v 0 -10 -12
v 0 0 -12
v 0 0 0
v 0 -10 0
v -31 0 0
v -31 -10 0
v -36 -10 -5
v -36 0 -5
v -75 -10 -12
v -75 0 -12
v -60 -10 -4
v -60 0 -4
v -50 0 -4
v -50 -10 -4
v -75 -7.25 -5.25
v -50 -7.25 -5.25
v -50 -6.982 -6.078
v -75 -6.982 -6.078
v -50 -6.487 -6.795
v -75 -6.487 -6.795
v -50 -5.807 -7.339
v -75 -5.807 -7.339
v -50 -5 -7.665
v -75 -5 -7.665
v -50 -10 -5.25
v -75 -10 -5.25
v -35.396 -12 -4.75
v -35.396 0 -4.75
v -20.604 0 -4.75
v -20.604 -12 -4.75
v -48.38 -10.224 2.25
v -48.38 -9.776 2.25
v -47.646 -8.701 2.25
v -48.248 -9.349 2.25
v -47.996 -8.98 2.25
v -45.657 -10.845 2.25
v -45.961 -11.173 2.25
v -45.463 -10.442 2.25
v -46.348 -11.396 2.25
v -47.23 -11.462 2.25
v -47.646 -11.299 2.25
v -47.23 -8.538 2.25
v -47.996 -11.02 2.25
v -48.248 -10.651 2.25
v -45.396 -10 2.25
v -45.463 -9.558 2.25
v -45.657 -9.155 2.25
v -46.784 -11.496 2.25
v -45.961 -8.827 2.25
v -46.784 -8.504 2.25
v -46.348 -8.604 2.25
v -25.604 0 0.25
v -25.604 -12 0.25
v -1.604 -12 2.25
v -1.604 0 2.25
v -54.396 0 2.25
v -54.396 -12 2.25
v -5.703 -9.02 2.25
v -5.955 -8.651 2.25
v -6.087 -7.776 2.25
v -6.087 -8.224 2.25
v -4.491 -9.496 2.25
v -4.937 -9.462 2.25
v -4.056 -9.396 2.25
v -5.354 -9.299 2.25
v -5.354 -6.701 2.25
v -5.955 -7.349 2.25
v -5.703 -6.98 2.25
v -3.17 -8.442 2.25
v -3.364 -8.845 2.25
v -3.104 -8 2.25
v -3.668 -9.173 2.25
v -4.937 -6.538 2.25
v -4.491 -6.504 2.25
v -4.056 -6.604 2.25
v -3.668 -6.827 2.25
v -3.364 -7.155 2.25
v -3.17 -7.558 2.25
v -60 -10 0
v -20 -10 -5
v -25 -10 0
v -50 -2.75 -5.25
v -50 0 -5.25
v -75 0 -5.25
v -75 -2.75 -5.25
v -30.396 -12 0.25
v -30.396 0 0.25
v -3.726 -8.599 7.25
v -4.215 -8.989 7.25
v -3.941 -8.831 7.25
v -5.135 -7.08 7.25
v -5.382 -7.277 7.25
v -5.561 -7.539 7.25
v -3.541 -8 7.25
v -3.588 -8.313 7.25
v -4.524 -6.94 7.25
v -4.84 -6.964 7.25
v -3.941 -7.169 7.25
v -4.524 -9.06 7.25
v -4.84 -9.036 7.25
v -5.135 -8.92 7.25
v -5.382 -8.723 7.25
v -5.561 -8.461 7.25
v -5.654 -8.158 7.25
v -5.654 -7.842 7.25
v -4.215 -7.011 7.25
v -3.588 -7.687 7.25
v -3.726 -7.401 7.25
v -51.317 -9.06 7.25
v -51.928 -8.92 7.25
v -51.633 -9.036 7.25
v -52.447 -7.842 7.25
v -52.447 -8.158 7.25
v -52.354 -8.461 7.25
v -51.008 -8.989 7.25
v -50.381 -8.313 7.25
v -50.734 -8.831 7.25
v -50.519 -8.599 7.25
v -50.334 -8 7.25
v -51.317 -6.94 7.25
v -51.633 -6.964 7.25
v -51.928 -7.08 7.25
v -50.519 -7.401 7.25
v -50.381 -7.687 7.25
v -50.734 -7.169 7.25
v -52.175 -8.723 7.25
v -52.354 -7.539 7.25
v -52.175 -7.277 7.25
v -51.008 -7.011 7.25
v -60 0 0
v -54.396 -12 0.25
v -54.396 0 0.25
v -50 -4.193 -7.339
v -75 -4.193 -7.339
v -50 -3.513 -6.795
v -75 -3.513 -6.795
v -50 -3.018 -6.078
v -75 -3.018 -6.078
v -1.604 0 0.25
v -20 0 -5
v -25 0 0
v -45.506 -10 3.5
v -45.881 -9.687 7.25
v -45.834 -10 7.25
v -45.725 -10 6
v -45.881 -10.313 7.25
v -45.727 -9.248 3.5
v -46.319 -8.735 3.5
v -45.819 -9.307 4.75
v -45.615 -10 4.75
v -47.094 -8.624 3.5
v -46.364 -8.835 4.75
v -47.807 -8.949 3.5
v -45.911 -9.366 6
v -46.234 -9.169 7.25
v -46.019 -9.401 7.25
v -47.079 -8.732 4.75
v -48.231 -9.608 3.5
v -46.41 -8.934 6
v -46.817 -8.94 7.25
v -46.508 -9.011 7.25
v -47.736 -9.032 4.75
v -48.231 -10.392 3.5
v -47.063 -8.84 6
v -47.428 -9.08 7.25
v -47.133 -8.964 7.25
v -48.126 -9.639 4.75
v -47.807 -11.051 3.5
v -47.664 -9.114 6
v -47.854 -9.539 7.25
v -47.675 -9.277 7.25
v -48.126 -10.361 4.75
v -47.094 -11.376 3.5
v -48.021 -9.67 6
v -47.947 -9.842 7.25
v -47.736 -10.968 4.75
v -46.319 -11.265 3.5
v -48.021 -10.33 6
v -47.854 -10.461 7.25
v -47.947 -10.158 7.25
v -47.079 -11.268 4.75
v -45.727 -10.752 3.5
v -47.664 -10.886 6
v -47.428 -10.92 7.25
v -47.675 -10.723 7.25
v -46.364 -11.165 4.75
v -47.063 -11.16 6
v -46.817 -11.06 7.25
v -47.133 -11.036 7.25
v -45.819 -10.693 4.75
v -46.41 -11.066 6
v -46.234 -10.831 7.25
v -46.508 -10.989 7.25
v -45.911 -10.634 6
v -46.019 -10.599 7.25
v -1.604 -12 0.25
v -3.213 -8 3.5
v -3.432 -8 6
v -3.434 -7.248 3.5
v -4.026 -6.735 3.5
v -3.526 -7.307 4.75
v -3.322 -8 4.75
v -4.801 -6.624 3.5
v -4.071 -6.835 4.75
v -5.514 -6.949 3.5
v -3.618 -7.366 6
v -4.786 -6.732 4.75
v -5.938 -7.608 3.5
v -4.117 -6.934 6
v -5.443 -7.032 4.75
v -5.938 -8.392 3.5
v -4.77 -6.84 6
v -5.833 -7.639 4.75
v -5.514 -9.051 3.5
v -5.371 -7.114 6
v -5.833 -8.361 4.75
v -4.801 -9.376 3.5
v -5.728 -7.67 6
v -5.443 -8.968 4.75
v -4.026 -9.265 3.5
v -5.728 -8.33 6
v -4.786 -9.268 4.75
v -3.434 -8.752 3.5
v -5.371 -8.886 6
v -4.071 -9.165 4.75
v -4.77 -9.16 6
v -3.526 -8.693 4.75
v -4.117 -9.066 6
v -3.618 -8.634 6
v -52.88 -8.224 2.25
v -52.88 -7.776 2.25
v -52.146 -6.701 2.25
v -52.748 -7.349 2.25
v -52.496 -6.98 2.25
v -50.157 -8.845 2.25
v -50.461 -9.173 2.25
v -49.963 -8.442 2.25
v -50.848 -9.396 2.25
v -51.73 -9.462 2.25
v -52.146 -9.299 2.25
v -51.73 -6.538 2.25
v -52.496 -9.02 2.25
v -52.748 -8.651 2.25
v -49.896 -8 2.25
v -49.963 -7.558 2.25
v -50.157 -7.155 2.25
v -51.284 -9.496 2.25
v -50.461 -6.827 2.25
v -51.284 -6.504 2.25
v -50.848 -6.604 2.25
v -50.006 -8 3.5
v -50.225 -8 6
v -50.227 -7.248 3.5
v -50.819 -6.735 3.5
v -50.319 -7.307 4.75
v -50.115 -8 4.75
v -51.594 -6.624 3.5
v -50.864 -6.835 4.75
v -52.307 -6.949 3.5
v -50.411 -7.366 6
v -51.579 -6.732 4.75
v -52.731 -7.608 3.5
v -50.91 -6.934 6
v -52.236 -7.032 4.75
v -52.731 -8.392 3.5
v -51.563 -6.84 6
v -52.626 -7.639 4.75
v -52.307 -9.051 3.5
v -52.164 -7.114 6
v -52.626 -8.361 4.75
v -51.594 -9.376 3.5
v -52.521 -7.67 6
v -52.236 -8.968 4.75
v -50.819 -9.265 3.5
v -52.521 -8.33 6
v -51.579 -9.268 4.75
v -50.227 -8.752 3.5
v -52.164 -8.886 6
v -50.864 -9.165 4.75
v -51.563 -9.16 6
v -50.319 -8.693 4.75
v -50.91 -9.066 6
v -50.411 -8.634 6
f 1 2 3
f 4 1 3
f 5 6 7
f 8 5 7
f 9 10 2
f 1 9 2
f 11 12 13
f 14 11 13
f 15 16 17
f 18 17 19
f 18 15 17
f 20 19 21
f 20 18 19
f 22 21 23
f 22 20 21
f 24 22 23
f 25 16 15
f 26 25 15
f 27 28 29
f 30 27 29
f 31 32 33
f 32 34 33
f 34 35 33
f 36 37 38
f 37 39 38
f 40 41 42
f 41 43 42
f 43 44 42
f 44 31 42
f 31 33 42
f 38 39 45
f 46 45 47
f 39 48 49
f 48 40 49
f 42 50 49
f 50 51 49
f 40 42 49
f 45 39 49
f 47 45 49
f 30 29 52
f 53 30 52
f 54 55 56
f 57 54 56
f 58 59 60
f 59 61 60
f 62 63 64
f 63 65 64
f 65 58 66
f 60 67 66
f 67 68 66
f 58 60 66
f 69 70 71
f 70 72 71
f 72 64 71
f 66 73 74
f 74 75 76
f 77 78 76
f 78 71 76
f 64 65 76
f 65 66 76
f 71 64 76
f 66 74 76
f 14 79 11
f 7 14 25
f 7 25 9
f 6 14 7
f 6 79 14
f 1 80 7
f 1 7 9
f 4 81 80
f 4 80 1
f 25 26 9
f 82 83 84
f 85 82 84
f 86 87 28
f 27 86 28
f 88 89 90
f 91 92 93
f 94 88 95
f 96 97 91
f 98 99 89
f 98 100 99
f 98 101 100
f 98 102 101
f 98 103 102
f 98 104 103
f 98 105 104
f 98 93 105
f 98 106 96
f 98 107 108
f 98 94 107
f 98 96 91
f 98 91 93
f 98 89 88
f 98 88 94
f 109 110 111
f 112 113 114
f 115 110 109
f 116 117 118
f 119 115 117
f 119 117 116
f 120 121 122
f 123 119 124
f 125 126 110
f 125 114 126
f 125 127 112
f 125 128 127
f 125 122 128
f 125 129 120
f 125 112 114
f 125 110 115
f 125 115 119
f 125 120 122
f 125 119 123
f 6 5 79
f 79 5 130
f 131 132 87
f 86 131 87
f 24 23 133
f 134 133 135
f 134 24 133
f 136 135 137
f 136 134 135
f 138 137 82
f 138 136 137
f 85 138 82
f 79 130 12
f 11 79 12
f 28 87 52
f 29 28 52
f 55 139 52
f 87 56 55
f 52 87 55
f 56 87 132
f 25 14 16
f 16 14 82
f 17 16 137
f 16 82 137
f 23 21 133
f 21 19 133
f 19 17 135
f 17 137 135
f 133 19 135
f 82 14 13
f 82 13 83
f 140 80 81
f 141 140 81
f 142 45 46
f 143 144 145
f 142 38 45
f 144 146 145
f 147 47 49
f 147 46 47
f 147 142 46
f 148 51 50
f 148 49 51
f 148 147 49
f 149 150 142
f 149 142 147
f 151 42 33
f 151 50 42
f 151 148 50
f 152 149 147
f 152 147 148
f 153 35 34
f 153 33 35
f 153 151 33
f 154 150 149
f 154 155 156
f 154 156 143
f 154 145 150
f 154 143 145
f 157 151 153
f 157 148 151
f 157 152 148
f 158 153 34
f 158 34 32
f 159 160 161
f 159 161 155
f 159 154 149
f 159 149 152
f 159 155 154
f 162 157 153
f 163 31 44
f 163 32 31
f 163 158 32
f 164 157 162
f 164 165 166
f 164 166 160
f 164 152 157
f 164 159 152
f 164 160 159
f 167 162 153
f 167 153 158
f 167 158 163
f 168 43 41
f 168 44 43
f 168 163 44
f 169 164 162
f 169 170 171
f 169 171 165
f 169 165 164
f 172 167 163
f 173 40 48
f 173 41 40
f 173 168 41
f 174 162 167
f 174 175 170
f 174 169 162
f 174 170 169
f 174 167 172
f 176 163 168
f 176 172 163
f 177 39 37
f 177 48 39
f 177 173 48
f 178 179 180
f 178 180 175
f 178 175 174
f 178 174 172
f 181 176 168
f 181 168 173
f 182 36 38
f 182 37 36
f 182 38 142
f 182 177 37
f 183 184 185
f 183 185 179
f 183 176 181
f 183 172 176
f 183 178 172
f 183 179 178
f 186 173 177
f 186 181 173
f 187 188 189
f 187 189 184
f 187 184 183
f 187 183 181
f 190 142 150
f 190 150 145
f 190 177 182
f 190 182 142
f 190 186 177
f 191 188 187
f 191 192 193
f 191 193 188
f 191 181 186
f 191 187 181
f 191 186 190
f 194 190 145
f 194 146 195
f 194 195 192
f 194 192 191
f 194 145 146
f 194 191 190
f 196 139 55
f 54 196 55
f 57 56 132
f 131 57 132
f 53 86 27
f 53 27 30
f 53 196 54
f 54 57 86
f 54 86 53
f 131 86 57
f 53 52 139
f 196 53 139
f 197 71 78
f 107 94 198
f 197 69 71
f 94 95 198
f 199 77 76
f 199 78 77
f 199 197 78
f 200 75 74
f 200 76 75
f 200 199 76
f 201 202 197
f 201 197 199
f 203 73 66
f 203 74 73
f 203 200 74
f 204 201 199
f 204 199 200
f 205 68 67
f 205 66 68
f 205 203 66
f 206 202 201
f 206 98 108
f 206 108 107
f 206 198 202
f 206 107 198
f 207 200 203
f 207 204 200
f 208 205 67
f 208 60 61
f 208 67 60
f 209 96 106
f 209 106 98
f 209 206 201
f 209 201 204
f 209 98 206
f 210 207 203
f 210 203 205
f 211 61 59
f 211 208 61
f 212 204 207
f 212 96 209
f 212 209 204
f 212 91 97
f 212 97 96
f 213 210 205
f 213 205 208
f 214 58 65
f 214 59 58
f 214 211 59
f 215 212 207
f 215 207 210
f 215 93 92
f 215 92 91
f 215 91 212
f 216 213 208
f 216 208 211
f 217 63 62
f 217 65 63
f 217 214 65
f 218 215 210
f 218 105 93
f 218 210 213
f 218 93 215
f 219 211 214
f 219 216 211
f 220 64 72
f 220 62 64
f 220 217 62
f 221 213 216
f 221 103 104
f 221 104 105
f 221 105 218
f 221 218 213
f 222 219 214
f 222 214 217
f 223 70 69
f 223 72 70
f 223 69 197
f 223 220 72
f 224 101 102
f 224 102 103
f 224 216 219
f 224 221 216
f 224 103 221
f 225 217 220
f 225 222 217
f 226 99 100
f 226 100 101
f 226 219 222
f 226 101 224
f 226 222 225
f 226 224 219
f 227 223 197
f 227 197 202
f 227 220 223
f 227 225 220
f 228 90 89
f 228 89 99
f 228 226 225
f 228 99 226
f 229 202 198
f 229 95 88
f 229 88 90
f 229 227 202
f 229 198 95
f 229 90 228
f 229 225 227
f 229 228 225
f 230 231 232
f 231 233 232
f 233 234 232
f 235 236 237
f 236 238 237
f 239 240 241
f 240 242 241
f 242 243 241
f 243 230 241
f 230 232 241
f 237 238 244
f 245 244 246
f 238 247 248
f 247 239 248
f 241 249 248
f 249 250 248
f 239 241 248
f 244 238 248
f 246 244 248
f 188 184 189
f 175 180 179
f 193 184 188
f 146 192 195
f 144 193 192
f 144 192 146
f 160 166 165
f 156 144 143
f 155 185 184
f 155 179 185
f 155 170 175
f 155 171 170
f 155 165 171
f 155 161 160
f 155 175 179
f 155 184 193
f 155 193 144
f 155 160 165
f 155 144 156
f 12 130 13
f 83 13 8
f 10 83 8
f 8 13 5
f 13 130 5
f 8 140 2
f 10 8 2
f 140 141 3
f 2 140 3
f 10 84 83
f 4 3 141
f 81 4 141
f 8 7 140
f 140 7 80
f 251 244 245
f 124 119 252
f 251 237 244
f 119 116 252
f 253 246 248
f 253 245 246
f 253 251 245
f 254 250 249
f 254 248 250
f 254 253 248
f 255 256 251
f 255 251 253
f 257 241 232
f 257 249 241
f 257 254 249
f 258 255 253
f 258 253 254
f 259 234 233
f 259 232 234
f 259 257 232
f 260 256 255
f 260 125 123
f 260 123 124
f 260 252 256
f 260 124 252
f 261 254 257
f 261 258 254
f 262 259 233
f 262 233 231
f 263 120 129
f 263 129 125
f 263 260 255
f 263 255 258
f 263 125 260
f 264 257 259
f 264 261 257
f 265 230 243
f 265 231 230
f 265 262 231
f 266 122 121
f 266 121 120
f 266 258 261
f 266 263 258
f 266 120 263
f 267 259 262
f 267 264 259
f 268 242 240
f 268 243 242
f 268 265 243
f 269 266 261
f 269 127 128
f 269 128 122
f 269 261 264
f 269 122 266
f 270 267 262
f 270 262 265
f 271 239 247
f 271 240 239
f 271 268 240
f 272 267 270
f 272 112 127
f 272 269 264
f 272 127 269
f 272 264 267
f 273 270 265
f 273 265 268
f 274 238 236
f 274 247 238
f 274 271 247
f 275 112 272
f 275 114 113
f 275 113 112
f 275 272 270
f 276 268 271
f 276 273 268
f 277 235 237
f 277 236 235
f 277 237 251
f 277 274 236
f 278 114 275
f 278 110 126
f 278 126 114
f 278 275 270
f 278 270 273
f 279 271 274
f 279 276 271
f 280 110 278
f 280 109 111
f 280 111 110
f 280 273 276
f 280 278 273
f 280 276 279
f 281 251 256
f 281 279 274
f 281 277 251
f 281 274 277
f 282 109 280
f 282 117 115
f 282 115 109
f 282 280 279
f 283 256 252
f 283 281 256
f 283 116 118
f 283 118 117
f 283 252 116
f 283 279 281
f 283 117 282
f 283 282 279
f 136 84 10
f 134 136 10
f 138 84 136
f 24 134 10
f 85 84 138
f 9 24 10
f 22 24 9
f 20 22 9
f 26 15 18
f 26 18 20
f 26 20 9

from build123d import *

# Parameters (mm, degrees)
F1_DEPTH    = 10
F2_W        = 25
F2_H        = 4.5
F3_DEPTH    = 2.5
F6_DEPTH    = 10.001
F7_T1_DEPTH = 32.3950997289
F9_DEPTH    = 12
F10_R       = 1.5
F11_DEPTH   = 5
F11_TAPER   = 5


# Not quite as in the source:
# - a fillet or chamfer that OpenCascade refuses, or shapes differently, is made with other operations: its cross-section is extruded or revolved along the edge and cut away or added


with BuildPart() as f1:
    # F0 (on Front) → F1 (new body)
    with BuildSketch(Plane.XZ):
        Polygon((0, -12), (0, 0), (-60, 0), (-60, -4), (-50, -4), (-50, -5.25), (-75, -5.25), (-75, -12), (-70, -12), (-5, -12), align=None)
    extrude(amount=F1_DEPTH)

    # F2 (on face) → F3 (cut)
    with BuildSketch(Plane.XY.offset(-5.25)):
        with Locations((-62.5, -5)):
            Rectangle(F2_W, F2_H)
    extrude(amount=-F3_DEPTH, mode=Mode.SUBTRACT)

    # F5 (on face) → F6 (cut, through all)
    with BuildSketch(Plane.XZ.offset(10)):
        Polygon((-28, 0), (-31, 0), (-36, -5), (-28, -5), (-20, -5), (-25, 0), align=None)
    extrude(amount=-F6_DEPTH, mode=Mode.SUBTRACT)

    # F7: fillet of radius 3 on 2 edges, made by hand

    # F7_s2 → F7_t1 (join)
    with BuildSketch(Plane.YZ.offset(-75)):
        with BuildLine():
            ThreePointArc((-5.7080398916, -7.75), (-3.7715482184, -7.0412878475), (-2.75, -5.25))
            Line((-2.75, -5.25), (-2.75, -7.75))
            Line((-2.75, -7.75), (-5.7080398916, -7.75))
        make_face()
        with BuildLine():
            ThreePointArc((-7.25, -5.25), (-6.2284517816, -7.0412878475), (-4.2919601084, -7.75))
            Line((-4.2919601084, -7.75), (-7.25, -7.75))
            Line((-7.25, -7.75), (-7.25, -5.25))
        make_face()
    extrude(amount=F7_T1_DEPTH)


with BuildPart() as f9:
    # F8 (on Front) → F9 (new body)
    with BuildSketch(Plane.XZ):
        Polygon((-20.6035533906, -4.75), (-25.6035533906, 0.25), (-1.6035533906, 0.25), (-1.6035533906, 2.25), (-54.3964466094, 2.25), (-54.3964466094, 0.25), (-30.3964466094, 0.25), (-35.3964466094, -4.75), align=None)
    extrude(amount=F9_DEPTH)


with BuildPart() as f11:
    # F10 (on face) → F11 (new body)
    with BuildSketch(Plane.XY.offset(2.25)):
        with Locations((-46.8964466094, -10)):
            Circle(F10_R)
    extrude(amount=F11_DEPTH, taper=F11_TAPER)


with BuildPart() as f11b:
    # F10 (on face) → F11, piece 2 (new body)
    with BuildSketch(Plane.XY.offset(2.25)):
        with Locations((-51.3964466094, -8)):
            Circle(F10_R)
    extrude(amount=F11_DEPTH, taper=F11_TAPER)


with BuildPart() as f11c:
    # F10 (on face) → F11, piece 3 (new body)
    with BuildSketch(Plane.XY.offset(2.25)):
        with Locations((-4.6035533906, -8)):
            Circle(F10_R)
    extrude(amount=F11_DEPTH, taper=F11_TAPER)


solid = Compound([f1.part, f9.part, f11.part, f11b.part, f11c.part])
